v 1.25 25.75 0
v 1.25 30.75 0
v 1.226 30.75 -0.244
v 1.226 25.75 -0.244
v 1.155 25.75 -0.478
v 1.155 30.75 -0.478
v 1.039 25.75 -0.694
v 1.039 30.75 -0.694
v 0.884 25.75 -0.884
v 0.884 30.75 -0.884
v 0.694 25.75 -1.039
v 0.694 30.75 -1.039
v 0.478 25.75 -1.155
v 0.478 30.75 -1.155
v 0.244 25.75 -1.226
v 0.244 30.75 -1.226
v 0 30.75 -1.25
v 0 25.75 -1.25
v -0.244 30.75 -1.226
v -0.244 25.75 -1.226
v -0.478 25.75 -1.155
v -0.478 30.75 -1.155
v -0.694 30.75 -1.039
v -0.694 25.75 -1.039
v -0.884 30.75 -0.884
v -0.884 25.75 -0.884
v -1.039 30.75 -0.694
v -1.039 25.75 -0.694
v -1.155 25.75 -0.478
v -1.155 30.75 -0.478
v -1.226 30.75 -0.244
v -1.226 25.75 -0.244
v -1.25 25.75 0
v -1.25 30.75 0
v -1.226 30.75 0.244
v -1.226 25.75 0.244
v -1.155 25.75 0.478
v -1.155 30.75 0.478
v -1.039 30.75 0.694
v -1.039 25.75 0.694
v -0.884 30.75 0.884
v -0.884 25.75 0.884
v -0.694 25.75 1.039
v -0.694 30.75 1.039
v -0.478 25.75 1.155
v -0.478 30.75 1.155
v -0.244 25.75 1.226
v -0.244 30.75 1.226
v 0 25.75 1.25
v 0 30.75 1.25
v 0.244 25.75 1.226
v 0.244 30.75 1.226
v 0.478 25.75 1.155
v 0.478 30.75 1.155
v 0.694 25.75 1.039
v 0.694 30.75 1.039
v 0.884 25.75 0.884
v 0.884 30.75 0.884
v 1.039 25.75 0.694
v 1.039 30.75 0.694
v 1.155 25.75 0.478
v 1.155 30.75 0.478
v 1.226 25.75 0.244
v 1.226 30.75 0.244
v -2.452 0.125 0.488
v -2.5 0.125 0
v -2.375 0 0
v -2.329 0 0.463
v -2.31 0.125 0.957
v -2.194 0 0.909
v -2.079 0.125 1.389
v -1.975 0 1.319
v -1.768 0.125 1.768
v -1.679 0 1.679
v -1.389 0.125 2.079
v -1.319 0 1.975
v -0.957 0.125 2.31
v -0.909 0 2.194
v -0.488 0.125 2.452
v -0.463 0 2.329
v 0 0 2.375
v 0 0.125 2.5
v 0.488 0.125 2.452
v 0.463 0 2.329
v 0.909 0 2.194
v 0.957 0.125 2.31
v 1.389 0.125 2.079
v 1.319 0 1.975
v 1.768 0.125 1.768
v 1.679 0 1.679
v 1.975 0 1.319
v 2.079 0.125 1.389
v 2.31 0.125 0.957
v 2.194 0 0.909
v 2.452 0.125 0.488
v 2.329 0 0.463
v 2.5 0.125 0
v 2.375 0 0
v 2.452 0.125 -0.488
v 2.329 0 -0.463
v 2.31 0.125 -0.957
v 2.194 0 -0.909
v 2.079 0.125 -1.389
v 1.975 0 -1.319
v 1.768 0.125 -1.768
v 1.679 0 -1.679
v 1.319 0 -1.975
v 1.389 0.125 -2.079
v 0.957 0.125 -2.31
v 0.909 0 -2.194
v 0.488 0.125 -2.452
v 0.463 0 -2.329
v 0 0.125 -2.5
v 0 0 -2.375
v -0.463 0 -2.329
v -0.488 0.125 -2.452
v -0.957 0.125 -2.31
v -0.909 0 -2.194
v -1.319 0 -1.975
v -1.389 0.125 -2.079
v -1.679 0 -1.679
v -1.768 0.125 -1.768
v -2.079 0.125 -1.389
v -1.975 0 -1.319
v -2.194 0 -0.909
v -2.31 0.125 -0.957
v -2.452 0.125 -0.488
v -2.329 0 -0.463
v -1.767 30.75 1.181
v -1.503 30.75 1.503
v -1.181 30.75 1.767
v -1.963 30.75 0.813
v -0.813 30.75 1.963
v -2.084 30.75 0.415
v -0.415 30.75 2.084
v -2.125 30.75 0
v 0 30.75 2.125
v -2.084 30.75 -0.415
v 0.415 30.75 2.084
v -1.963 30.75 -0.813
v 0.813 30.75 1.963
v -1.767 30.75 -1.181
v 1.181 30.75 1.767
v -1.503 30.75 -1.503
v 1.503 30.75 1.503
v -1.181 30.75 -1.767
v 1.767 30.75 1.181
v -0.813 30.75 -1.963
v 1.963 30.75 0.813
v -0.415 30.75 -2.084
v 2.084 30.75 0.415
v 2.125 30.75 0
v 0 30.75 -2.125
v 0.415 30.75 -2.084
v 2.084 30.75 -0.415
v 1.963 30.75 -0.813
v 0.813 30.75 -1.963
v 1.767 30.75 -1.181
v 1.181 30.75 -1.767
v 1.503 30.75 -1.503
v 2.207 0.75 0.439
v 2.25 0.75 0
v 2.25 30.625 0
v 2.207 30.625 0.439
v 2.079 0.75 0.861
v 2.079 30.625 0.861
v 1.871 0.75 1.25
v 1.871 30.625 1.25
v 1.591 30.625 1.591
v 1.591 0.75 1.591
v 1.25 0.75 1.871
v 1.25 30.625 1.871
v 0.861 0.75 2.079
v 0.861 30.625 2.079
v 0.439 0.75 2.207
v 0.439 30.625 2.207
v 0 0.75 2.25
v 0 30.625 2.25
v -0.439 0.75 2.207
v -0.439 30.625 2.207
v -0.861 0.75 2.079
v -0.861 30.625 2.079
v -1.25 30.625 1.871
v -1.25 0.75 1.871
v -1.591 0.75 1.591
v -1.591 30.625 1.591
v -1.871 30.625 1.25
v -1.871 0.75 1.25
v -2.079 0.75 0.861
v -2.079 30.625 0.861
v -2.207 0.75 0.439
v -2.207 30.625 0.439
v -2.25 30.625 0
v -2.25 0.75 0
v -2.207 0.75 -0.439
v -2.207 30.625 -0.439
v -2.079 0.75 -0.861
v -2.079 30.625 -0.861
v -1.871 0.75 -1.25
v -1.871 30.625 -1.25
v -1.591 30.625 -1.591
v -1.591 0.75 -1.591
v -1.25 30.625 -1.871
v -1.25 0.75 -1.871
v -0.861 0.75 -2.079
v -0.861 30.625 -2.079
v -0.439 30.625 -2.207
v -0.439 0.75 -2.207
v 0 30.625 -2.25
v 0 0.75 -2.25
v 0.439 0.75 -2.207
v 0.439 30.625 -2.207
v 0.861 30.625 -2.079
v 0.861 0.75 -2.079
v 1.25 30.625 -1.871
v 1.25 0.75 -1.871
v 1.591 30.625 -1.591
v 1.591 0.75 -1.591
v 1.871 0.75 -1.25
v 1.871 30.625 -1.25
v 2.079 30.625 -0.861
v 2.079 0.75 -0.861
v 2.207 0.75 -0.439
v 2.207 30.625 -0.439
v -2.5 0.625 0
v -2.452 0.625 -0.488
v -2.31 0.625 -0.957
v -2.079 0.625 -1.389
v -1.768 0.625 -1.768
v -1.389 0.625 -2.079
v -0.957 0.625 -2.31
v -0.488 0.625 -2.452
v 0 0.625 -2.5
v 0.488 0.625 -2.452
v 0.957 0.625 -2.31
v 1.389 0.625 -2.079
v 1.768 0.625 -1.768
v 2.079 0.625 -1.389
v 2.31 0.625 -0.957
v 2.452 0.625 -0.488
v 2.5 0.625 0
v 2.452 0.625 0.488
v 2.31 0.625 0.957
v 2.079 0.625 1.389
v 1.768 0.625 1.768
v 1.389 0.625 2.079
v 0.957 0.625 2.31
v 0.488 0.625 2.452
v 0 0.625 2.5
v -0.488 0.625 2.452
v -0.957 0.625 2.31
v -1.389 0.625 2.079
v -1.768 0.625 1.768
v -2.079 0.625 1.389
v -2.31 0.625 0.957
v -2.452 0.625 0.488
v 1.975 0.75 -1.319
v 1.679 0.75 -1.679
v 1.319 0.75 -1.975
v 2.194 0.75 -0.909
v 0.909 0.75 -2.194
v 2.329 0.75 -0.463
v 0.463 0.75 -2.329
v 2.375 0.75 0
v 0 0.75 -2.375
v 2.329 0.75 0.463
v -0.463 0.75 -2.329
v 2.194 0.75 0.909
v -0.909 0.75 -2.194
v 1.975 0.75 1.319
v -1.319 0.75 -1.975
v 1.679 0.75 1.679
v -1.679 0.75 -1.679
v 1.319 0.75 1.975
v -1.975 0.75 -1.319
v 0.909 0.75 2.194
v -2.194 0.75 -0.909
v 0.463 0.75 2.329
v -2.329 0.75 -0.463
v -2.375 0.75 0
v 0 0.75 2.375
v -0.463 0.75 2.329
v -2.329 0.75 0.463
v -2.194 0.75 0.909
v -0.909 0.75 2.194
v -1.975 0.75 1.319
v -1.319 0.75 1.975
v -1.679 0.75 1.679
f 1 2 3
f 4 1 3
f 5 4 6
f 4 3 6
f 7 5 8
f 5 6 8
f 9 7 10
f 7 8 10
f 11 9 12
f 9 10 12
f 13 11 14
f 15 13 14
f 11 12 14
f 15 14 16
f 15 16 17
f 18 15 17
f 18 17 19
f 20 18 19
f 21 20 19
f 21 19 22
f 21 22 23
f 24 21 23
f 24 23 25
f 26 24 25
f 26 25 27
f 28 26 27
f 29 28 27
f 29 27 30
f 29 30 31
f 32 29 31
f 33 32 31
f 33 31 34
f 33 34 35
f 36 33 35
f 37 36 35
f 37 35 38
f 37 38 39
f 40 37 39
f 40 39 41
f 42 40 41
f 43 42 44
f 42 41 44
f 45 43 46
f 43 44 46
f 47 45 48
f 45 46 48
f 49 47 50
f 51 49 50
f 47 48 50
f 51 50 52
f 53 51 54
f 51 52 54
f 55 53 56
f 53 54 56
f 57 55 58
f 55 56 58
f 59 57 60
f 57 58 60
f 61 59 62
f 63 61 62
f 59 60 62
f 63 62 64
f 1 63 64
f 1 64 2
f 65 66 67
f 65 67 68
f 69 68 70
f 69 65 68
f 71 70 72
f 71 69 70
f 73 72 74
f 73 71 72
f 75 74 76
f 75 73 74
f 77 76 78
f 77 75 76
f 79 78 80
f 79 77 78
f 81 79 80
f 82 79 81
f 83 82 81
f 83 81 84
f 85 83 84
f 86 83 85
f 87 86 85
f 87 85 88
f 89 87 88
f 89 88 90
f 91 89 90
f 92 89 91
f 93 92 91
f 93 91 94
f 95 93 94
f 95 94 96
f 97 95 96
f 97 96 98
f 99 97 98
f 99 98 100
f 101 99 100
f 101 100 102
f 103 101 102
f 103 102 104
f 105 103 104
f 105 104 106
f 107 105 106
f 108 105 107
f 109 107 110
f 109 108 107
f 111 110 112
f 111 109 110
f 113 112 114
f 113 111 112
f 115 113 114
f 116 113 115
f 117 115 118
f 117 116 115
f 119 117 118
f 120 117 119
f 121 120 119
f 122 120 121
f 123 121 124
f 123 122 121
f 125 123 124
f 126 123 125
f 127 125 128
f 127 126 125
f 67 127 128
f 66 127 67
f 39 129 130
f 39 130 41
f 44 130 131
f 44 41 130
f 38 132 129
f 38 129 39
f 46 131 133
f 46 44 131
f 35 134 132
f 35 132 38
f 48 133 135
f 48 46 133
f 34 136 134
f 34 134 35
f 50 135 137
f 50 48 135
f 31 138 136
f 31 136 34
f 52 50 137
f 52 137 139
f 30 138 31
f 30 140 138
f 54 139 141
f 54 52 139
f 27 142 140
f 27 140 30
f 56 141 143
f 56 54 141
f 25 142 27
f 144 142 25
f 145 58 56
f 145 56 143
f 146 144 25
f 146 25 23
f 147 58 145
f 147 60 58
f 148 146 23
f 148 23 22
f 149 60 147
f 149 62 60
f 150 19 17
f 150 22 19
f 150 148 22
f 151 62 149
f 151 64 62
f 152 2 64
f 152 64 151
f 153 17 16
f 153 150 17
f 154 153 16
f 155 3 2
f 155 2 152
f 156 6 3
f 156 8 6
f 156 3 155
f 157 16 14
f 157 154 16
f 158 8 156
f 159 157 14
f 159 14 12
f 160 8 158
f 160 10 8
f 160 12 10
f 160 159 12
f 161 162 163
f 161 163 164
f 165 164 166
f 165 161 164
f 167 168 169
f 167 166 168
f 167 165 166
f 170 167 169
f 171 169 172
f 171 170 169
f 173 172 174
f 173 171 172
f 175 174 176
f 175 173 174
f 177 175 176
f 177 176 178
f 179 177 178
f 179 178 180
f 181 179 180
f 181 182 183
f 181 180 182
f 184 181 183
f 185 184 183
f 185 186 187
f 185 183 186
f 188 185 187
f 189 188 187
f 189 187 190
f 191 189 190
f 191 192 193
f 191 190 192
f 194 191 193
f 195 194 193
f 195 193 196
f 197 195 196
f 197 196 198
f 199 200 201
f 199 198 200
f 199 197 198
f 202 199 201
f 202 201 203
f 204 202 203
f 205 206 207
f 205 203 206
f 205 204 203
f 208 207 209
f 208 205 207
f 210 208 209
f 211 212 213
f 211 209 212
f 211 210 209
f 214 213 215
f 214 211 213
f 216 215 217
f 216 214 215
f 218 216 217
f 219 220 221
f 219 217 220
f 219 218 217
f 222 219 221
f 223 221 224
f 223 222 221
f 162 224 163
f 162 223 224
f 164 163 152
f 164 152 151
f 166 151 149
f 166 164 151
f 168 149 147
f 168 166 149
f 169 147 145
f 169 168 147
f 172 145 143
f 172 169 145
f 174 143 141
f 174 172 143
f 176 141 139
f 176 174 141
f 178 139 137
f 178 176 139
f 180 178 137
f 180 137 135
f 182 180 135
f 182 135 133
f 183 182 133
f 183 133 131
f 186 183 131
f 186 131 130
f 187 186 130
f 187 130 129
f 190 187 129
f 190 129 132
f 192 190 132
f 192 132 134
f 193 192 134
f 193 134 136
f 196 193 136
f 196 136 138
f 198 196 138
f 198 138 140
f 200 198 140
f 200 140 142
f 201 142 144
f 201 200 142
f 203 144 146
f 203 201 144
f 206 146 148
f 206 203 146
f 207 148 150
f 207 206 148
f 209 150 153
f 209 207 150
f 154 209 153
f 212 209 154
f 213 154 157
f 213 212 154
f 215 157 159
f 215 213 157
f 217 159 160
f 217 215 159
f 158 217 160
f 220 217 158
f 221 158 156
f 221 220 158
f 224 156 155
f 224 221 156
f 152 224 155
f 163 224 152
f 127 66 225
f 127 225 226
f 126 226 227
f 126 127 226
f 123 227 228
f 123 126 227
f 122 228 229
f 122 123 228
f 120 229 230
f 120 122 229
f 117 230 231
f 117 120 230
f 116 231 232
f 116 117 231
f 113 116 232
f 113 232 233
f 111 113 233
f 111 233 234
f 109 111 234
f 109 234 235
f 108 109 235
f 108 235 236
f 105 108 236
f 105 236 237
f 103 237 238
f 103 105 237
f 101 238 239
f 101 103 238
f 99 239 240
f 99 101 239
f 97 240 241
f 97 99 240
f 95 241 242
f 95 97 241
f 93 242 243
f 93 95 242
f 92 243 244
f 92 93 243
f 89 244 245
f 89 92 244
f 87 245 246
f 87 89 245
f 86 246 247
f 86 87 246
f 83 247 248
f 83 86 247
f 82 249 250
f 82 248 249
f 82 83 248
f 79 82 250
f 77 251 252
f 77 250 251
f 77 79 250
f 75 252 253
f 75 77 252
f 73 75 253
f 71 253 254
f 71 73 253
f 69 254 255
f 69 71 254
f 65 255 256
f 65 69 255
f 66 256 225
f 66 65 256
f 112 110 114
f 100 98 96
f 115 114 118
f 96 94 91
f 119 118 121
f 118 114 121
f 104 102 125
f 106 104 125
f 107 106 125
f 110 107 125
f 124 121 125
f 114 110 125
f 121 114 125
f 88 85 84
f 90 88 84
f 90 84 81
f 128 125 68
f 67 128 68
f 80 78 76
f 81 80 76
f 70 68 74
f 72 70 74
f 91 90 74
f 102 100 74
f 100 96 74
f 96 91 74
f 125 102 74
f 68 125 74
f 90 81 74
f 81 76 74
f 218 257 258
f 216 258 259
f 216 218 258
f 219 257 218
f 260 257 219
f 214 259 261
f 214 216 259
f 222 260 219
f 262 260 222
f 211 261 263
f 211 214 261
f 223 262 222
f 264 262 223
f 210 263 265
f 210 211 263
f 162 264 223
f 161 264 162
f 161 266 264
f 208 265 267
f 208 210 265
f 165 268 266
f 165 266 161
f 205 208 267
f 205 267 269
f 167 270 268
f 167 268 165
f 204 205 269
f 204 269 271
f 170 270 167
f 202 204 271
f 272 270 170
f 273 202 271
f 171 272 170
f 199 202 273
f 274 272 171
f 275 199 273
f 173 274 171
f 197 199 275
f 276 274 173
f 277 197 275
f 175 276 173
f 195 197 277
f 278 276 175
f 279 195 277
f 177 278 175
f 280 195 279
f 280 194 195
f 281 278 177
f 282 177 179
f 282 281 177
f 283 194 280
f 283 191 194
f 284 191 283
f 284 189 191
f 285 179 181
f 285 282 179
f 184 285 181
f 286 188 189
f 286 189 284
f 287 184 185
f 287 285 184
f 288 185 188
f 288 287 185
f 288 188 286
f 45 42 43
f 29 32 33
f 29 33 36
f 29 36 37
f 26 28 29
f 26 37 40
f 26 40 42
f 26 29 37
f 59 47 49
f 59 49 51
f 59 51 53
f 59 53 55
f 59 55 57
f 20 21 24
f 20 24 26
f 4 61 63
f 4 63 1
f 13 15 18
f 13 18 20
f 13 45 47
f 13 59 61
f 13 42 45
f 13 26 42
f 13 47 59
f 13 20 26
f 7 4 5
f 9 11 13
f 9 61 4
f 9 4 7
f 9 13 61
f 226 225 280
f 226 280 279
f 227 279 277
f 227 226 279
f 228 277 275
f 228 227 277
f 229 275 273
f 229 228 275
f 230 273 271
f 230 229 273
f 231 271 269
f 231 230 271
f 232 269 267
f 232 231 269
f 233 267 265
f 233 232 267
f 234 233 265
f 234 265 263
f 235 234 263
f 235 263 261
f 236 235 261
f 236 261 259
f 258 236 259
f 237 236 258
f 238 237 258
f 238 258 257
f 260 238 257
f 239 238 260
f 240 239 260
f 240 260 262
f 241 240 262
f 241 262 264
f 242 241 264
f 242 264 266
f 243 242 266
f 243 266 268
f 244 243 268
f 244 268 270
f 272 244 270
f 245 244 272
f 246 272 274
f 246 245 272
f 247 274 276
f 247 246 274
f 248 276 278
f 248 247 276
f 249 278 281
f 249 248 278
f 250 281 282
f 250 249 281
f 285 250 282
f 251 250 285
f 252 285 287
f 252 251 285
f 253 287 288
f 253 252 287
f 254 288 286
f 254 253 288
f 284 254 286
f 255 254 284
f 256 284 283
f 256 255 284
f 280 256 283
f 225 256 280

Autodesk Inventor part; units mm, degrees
ref_plane "YZ Plane" through (0, 0, 0) normal (1, 0, 0) x (0, 1, 0)
ref_plane "XZ Plane" through (0, 0, 0) normal (0, 1, 0) x (-1, 0, 0)
ref_plane "XY Plane" through (0, 0, 0) normal (0, 0, 1) x (1, 0, 0)
sketch "Sketch1" plane through (0, 0, 0) normal (0, 1, 0) x (-1, 0, 0)
  circle A0 centre (0, 0) radius 2.5
  dimension "d0" = 5
extrude "Extrusion1" add sketch "Sketch1" along normal blind 0.75
chamfer "Chamfer1" distance 0.125 angle 45 2 edges at (2.5, 0, 0) (2.5, 0.75, 0)
sketch "Sketch2" plane through (0, 0.75, 0) normal (0, 1, 0) x (1, 0, 0)
  circle A0 centre (0, 0) radius 2.25
  dimension "d6" = 4.5
extrude "Extrusion2" add sketch "Sketch2" along normal blind 30
sketch "Sketch3" plane through (0, 30.75, 0) normal (0, 1, 0) x (1, 0, 0)
  circle A0 centre (0, 0) radius 1.25
  dimension "d9" = 2.5
extrude "Extrusion3" cut sketch "Sketch3" against normal blind 5
thread "Thread1" size "M2.5x0.45" class "6H" standard "ANSI Metric M Profile" full length
chamfer "Chamfer2" distance 0.125 angle 45 1 edges at (-2.25, 30.75, 0)
properties part number "Z25_Hinge_Shaft" material "Stainless Steel"
